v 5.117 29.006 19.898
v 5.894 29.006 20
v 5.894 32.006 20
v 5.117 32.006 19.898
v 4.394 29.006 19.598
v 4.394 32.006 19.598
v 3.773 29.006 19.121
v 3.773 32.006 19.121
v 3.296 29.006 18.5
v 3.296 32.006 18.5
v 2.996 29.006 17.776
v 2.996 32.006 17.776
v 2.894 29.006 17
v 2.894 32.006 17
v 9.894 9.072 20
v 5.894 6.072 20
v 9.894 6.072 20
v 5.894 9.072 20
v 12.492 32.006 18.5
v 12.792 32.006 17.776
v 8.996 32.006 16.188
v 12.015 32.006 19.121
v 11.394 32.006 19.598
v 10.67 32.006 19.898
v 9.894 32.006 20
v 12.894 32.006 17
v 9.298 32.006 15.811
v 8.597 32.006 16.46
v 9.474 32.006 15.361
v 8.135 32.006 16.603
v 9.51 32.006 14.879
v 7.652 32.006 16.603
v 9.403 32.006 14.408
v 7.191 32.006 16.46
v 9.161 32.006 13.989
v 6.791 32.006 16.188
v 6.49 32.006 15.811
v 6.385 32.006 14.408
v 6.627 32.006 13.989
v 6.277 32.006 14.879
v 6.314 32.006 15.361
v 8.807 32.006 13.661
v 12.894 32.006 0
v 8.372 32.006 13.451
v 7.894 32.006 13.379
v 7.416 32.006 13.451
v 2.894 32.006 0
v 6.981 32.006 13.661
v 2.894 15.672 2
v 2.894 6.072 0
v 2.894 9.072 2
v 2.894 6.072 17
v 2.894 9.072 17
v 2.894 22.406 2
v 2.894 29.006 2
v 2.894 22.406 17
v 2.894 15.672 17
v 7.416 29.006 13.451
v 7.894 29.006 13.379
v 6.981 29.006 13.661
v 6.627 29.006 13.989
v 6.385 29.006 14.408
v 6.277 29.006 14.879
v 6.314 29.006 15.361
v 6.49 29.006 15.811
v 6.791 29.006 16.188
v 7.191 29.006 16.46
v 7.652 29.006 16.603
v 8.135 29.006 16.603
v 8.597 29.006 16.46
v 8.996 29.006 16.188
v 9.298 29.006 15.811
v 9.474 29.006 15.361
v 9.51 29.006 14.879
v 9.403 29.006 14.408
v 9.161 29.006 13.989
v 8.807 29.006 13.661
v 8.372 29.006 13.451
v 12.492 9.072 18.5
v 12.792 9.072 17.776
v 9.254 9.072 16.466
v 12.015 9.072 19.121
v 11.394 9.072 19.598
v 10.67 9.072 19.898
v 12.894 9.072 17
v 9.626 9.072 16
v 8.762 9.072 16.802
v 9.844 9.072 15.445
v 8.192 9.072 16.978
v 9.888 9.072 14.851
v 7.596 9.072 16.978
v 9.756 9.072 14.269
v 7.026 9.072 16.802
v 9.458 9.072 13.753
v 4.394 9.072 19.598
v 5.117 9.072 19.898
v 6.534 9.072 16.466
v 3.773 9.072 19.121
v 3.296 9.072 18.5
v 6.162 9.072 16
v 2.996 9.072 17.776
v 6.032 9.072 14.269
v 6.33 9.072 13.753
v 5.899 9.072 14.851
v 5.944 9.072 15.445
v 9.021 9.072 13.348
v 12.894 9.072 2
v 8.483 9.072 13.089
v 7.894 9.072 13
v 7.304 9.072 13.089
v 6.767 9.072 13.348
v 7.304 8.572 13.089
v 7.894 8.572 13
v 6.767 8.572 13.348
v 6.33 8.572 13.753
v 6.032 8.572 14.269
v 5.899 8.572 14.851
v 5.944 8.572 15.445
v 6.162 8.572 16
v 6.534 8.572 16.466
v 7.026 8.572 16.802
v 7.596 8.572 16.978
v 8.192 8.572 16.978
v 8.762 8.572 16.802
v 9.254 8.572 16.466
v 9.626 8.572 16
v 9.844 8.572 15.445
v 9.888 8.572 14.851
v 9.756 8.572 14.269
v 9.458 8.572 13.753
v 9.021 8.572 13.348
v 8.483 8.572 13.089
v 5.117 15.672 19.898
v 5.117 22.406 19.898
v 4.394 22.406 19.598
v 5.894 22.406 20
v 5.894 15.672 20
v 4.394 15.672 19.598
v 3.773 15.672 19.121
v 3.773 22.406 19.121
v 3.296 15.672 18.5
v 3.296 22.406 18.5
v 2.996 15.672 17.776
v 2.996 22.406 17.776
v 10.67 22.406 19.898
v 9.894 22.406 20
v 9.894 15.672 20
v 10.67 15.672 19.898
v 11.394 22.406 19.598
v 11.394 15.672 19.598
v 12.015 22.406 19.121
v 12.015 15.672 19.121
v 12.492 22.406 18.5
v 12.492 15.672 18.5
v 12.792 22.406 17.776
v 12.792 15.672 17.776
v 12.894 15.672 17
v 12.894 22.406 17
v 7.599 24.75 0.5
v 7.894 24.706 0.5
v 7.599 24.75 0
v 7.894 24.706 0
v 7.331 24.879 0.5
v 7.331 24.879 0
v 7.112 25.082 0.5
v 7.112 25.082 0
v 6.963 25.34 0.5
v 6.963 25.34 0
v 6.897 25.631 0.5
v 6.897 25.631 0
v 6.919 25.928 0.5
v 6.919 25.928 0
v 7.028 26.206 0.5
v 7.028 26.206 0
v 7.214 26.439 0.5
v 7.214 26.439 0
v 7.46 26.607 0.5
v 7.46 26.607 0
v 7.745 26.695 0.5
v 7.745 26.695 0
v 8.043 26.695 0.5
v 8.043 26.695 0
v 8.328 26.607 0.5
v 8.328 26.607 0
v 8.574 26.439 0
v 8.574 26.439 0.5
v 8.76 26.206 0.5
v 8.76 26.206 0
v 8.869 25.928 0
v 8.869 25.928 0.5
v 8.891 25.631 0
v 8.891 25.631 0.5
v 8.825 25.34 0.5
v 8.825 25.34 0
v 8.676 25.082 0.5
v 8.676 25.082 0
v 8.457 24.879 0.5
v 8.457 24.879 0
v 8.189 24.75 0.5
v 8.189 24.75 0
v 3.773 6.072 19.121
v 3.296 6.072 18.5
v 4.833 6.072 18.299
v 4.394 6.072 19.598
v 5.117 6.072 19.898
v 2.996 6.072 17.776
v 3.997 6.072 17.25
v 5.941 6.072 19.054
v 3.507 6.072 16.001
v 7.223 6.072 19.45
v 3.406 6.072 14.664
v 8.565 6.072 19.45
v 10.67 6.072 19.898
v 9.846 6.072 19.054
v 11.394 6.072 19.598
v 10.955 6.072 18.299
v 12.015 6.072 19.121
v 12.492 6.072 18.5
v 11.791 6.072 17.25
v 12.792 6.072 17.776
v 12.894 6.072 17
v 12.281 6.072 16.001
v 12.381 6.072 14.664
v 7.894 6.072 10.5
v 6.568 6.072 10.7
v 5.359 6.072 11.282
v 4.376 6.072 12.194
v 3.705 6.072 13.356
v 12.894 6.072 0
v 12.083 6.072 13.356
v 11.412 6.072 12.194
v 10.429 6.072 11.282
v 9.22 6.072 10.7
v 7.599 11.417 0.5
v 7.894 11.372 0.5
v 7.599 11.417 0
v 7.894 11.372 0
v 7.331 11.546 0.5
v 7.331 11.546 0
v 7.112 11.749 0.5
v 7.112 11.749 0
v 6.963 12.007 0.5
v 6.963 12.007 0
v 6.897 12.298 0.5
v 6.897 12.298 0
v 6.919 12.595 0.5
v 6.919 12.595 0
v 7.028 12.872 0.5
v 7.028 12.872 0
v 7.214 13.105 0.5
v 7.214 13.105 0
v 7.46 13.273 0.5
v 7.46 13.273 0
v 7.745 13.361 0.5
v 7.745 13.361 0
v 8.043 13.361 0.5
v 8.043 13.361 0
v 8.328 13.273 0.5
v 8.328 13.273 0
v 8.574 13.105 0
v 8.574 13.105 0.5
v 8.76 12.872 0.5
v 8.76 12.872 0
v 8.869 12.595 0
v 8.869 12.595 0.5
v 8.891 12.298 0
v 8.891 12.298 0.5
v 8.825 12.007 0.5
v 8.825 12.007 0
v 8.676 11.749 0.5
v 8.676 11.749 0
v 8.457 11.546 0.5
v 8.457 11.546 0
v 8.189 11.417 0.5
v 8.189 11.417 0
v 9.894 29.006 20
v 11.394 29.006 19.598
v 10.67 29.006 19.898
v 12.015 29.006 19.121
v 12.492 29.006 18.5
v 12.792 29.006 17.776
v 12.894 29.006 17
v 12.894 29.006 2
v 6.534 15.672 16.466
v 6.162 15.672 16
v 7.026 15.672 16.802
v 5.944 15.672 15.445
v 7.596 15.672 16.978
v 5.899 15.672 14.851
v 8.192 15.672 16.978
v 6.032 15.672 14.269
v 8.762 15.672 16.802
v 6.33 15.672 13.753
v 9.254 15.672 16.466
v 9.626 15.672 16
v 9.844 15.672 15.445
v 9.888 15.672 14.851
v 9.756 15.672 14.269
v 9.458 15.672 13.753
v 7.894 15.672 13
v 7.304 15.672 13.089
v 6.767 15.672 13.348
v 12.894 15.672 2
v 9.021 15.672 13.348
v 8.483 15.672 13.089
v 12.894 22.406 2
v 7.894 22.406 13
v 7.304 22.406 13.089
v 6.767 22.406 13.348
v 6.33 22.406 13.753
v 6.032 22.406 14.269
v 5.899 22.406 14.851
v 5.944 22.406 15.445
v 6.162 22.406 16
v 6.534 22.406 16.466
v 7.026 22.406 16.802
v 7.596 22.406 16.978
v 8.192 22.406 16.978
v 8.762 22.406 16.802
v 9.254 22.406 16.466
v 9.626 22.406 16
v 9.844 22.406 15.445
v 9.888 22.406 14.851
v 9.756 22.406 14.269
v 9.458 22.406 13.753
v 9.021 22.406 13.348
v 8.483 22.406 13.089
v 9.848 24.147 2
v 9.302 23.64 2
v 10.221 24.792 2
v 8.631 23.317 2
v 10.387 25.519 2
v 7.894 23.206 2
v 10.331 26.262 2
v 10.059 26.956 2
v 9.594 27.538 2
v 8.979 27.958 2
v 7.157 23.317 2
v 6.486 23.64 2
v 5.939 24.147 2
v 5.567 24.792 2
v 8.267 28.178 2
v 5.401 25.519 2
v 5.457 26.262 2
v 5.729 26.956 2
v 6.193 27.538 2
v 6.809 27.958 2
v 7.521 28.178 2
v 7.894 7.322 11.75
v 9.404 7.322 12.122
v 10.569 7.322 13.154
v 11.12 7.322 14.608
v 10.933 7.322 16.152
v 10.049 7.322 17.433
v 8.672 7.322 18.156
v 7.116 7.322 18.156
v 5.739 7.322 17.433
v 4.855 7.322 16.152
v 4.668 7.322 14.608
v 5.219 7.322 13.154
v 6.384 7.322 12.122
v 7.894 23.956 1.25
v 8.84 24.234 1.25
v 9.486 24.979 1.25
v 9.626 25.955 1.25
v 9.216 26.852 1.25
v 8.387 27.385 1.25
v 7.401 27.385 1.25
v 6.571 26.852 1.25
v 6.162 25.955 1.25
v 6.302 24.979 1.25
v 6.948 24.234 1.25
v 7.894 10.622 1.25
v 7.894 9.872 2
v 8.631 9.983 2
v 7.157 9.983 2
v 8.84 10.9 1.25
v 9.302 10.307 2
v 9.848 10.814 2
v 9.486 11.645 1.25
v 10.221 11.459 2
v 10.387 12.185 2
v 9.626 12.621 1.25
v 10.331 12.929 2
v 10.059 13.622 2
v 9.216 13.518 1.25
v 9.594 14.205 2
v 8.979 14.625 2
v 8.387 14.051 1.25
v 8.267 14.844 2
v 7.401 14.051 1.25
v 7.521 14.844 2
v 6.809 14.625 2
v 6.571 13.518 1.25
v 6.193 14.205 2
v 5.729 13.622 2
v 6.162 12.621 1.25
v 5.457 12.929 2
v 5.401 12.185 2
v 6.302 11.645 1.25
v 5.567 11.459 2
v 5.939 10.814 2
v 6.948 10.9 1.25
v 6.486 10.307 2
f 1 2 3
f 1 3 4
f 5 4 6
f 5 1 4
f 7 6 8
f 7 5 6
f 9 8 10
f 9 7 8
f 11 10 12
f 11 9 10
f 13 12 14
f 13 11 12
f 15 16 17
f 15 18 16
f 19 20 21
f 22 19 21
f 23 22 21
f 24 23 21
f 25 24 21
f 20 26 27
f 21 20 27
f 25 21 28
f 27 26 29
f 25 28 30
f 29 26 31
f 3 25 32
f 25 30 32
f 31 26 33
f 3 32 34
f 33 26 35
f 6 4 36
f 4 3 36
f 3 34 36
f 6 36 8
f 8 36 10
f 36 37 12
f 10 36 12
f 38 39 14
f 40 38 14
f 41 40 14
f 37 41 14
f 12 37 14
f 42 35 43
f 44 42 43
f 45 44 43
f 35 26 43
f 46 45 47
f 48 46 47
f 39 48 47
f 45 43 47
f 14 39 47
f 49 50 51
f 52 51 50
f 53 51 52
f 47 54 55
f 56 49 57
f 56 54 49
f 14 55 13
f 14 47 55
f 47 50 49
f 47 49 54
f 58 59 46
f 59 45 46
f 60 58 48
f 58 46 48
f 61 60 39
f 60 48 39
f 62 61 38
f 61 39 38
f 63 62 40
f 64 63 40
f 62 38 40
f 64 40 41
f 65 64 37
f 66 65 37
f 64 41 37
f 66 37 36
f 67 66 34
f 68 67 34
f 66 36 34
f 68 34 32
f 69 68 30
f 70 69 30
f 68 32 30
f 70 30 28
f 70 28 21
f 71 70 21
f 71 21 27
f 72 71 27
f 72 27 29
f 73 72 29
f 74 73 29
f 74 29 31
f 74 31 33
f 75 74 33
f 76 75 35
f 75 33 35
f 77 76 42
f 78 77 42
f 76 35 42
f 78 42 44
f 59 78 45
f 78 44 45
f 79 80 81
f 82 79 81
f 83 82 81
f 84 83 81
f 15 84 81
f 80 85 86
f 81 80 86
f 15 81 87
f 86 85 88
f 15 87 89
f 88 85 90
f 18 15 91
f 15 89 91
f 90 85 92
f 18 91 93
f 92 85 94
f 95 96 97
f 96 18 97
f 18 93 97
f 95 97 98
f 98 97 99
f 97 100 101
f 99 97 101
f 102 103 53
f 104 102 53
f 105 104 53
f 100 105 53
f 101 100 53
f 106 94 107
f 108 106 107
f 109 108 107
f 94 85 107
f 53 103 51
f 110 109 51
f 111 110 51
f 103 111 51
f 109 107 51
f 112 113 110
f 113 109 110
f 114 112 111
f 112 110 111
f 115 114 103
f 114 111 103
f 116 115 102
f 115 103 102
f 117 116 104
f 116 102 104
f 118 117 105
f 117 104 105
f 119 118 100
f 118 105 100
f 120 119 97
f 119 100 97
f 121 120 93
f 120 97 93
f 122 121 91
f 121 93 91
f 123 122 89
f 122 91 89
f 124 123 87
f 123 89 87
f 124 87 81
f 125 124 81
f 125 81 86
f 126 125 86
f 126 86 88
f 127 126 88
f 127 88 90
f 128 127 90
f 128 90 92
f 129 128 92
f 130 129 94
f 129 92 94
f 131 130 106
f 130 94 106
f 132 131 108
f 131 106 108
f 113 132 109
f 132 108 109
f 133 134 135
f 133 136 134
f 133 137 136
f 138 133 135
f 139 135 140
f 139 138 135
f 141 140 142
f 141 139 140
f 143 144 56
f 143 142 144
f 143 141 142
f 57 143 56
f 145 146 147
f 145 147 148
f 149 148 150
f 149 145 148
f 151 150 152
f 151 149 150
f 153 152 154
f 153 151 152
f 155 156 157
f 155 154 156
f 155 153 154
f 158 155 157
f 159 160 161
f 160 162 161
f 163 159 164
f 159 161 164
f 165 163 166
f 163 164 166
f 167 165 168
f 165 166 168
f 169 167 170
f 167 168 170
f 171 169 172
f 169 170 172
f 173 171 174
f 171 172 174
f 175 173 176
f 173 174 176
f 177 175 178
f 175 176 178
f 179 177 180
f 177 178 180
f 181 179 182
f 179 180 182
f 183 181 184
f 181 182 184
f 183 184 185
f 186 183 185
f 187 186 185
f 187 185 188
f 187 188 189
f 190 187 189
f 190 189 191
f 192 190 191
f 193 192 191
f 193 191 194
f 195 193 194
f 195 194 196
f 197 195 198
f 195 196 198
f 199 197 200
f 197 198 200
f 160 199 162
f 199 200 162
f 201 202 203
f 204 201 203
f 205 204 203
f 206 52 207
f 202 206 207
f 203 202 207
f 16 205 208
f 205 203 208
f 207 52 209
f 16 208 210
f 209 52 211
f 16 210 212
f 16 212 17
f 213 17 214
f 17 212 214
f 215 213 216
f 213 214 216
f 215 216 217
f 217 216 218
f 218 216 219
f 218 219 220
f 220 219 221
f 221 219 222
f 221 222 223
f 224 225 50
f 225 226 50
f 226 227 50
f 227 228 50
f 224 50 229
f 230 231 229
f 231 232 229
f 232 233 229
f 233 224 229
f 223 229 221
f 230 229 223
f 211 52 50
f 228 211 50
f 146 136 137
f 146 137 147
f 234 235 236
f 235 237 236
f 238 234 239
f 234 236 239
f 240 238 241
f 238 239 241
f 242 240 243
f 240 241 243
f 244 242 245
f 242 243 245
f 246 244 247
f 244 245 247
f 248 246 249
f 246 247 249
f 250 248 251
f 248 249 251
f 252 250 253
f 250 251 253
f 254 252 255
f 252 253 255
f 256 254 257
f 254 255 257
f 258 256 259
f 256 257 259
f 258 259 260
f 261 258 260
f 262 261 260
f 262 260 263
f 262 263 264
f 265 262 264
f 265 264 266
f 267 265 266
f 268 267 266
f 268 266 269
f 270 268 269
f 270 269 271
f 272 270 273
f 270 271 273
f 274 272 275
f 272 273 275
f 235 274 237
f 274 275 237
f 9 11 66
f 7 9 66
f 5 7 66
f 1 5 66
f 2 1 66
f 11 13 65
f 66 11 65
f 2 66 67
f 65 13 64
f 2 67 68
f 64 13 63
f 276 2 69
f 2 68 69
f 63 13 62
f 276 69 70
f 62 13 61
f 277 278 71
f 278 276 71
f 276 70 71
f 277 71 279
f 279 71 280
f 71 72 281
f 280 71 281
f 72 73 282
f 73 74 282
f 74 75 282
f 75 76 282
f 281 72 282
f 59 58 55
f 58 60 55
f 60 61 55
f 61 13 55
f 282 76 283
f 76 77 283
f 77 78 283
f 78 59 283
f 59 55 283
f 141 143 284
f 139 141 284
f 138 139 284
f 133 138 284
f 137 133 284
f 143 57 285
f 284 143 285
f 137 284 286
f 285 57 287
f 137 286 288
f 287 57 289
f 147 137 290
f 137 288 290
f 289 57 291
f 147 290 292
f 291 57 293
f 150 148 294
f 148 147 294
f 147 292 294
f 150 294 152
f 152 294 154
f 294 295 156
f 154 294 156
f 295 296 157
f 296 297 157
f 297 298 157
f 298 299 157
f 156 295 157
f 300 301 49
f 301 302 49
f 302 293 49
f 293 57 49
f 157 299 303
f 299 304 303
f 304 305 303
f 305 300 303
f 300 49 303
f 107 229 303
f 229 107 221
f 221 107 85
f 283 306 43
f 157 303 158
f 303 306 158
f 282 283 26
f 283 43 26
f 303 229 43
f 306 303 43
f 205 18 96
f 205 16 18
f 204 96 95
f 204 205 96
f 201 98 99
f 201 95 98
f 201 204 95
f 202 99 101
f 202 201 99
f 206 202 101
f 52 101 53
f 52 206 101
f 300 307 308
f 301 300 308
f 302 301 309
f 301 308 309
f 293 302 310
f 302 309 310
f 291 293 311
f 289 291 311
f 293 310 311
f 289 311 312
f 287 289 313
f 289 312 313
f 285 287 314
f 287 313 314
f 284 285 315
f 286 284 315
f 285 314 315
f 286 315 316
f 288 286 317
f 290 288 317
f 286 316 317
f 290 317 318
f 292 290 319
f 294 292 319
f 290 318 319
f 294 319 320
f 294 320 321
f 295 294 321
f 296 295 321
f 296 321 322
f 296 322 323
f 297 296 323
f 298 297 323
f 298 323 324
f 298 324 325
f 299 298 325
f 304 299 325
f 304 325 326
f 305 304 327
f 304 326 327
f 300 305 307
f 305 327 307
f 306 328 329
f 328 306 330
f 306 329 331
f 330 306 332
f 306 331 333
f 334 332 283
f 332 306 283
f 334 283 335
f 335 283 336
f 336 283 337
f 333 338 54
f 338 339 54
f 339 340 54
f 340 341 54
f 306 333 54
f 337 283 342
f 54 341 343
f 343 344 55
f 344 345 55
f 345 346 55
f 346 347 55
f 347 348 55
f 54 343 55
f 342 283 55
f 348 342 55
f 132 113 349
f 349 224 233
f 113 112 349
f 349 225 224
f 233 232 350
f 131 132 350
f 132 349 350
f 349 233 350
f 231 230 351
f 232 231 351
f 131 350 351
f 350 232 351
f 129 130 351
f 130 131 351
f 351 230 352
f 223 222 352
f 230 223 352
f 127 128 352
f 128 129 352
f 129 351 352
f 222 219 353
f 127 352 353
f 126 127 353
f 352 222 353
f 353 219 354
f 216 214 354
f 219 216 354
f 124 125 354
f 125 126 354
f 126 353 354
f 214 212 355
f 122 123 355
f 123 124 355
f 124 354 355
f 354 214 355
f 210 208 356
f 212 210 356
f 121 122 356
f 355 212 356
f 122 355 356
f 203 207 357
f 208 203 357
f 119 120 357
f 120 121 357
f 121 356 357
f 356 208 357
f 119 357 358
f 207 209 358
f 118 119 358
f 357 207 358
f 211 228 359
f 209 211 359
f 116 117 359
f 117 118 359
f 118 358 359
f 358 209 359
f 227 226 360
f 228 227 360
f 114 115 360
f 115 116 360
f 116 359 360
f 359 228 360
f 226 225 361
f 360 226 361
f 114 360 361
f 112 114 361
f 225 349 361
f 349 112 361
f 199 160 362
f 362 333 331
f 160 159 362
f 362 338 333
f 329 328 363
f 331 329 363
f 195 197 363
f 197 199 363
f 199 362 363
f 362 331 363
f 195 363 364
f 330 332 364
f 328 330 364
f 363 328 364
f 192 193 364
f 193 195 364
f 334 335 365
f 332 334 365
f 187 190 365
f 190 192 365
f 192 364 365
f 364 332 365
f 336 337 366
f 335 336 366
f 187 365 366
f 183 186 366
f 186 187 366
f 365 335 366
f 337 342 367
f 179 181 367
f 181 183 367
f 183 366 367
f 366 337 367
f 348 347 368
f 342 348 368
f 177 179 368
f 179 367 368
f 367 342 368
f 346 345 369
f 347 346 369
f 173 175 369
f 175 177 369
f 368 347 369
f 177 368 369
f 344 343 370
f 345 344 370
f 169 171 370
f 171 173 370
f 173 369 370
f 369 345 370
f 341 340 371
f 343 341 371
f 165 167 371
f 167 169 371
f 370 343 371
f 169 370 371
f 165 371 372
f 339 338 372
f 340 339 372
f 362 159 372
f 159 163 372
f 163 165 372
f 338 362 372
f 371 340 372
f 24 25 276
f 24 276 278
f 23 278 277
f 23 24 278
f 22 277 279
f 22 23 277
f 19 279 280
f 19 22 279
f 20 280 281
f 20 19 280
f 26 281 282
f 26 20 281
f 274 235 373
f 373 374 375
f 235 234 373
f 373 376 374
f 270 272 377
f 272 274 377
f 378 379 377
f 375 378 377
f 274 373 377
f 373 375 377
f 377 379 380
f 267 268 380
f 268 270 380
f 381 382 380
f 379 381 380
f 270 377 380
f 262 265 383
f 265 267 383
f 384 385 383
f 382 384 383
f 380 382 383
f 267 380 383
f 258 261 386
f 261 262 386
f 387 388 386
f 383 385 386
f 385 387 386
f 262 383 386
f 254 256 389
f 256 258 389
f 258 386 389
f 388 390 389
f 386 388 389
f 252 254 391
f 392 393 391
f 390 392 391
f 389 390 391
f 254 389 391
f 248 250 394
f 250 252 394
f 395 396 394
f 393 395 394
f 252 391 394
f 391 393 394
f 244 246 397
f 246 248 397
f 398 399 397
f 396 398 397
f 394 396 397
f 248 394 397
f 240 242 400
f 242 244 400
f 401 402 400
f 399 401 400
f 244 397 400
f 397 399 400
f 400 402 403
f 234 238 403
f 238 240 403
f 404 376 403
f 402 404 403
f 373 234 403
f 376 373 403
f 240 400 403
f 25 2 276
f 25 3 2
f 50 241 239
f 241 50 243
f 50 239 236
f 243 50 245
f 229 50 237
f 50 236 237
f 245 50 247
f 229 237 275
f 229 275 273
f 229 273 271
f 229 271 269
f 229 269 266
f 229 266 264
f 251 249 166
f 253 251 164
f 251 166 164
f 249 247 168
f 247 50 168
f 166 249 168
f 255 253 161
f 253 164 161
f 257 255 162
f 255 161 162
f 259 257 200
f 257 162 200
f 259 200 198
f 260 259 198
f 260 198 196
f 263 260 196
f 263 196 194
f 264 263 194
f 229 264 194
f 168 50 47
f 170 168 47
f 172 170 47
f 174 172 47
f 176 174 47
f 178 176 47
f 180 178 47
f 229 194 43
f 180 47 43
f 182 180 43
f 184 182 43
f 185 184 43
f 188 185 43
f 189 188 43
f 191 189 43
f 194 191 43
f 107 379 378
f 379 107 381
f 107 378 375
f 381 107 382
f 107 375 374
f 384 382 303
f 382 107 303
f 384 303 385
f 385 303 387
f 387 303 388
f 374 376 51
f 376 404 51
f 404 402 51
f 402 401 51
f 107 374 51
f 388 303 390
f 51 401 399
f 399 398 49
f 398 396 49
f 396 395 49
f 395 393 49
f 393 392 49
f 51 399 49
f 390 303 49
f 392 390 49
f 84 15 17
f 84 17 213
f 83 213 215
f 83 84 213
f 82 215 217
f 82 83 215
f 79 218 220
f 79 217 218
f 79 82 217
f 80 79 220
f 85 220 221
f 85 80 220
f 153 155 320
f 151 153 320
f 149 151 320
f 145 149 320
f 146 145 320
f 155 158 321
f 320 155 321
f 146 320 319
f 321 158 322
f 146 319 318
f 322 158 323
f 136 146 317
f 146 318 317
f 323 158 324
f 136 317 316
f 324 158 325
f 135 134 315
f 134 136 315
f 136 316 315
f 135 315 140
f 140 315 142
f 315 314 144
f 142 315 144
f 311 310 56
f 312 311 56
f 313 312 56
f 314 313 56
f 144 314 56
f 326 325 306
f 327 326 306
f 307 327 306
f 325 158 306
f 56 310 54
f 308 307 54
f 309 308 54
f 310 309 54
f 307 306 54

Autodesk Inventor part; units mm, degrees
ref_plane "YZ Plane" through (0, 0, 0) normal (1, 0, 0) x (0, 1, 0)
ref_plane "XZ Plane" through (0, 0, 0) normal (0, 1, 0) x (-1, 0, 0)
ref_plane "XY Plane" through (0, 0, 0) normal (0, 0, 1) x (1, 0, 0)
sketch "Skizze1" plane through (0, 0, 0) normal (0, 0, 1) x (1, 0, 0)
  line L0 (12.8939, 32.0057) -> (2.8939, 32.0057)
  line L1 (2.8939, 32.0057) -> (2.8939, 29.0057)
  line L2 (2.8939, 29.0057) -> (12.8939, 29.0057)
  line L3 (12.8939, 29.0057) -> (12.8939, 32.0057)
  line L4 (12.8939, 9.0723) -> (2.8939, 9.0723)
  line L5 (2.8939, 9.0723) -> (2.8939, 6.0723)
  line L6 (2.8939, 6.0723) -> (12.8939, 6.0723)
  line L7 (12.8939, 6.0723) -> (12.8939, 9.0723)
  line L8 (2.8939, 15.6723) -> (12.8939, 15.6723)
  line L9 (12.8939, 15.6723) -> (12.8939, 22.4057)
  line L10 (12.8939, 22.4057) -> (2.8939, 22.4057)
  line L11 (2.8939, 22.4057) -> (2.8939, 15.6723)
  line L12 (2.8939, 9.0723) -> (2.8939, 15.6723) construction
  line L13 (2.8939, 22.4057) -> (2.8939, 29.0057) construction
  point P0 (0, 0)
  point P1 (7.8939, 9.0723)
  dimension "d0" = 10
  dimension "d1" = 3
  dimension "d2" = 3
  dimension "d35" = 25.9333
  dimension "d38" = 6.6
  dimension "d39" = 6.7333
extrude "Extrusion1" add sketch "Skizze1" along normal blind 20
fillet "Rundung1" radius 3 6 edges at (12.8939, 7.5723, 20) (12.8939, 30.5057, 20) (2.8939, 30.5057, 20) (2.8939, 7.5723, 20) (12.8939, 19.039, 20) (2.8939, 19.039, 20)
sketch "Skizze2" plane through (2.8939, 6.0723, 0) normal (0, -1, 0) x (1, 0, 0)
  circle A0 centre (5, 15) radius 5 construction
  line L0 (10, 0) -> (10, 17) construction
  line L1 (0, 0) -> (0, 17) construction
  line L2 (3, 20) -> (7, 20) construction
  point P0 (-2.8939, 0)
hole "Bohrung1" at (7.8939, 6.0723, 15) direction (0, 1, 0) diameter 3.242 end through all countersink diameter 9 countersink angle 90 thread size "M4x0.7" class "6H" standard "ISO Metric profile"
sketch "Skizze3" plane through (2.8939, 29.0057, 0) normal (0, -1, 0) x (1, 0, 0)
  line L0 (0, 0) -> (10, 0) projected
  line L1 (10, 0) -> (10, 2)
  line L2 (10, 0) -> (10, 17) projected
  line L3 (10, 2) -> (0, 2)
  line L4 (0, 0) -> (0, 17) projected
  point P0 (-2.8939, 0)
  dimension "d15" = 2
extrude "Extrusion2" add sketch "Skizze3" along normal through all
sketch "Skizze4" plane through (2.8939, 29.0057, 2) normal (0, 0, 1) x (1, 0, 0)
  line L0 (5, -16.6333) -> (10, -16.6333) construction
  line L1 (10, -16.6333) -> (10, 0) construction
  line L2 (10, -16.6333) -> (10, -19.9333) construction
  line L3 (5, -3.3) -> (0, -3.3) construction
  line L4 (0, 0) -> (0, -3.3) construction
  line L5 (5, -16.6333) -> (0, -16.6333) construction
  line L6 (0, 0) -> (0, -19.9333) construction
  point P0 (-2.8939, -29.0057)
  dimension "d34" = 13.3333
hole "Bohrung2" at (7.8939, 25.7057, 2) at (7.8939, 12.3723, 2) direction (0, 0, -1) diameter 2 end through all countersink diameter 5 countersink angle 90
sketch "Skizze5" plane through (2.8939, 6.0723, 0) normal (0, -1, 0) x (1, 0, 0)
  circle A0 centre (5, 15) radius 4.5 projected
  point P0 (-2.8939, 0)
hole "Bohrung3" at (7.8939, 6.0723, 15) direction (0, 1, 0) diameter 4 depth 22.9333
properties part number "HalterUmlenkrolleDPL" material "PC/ABS-Kunststoff, 3DDruck, PLA"
